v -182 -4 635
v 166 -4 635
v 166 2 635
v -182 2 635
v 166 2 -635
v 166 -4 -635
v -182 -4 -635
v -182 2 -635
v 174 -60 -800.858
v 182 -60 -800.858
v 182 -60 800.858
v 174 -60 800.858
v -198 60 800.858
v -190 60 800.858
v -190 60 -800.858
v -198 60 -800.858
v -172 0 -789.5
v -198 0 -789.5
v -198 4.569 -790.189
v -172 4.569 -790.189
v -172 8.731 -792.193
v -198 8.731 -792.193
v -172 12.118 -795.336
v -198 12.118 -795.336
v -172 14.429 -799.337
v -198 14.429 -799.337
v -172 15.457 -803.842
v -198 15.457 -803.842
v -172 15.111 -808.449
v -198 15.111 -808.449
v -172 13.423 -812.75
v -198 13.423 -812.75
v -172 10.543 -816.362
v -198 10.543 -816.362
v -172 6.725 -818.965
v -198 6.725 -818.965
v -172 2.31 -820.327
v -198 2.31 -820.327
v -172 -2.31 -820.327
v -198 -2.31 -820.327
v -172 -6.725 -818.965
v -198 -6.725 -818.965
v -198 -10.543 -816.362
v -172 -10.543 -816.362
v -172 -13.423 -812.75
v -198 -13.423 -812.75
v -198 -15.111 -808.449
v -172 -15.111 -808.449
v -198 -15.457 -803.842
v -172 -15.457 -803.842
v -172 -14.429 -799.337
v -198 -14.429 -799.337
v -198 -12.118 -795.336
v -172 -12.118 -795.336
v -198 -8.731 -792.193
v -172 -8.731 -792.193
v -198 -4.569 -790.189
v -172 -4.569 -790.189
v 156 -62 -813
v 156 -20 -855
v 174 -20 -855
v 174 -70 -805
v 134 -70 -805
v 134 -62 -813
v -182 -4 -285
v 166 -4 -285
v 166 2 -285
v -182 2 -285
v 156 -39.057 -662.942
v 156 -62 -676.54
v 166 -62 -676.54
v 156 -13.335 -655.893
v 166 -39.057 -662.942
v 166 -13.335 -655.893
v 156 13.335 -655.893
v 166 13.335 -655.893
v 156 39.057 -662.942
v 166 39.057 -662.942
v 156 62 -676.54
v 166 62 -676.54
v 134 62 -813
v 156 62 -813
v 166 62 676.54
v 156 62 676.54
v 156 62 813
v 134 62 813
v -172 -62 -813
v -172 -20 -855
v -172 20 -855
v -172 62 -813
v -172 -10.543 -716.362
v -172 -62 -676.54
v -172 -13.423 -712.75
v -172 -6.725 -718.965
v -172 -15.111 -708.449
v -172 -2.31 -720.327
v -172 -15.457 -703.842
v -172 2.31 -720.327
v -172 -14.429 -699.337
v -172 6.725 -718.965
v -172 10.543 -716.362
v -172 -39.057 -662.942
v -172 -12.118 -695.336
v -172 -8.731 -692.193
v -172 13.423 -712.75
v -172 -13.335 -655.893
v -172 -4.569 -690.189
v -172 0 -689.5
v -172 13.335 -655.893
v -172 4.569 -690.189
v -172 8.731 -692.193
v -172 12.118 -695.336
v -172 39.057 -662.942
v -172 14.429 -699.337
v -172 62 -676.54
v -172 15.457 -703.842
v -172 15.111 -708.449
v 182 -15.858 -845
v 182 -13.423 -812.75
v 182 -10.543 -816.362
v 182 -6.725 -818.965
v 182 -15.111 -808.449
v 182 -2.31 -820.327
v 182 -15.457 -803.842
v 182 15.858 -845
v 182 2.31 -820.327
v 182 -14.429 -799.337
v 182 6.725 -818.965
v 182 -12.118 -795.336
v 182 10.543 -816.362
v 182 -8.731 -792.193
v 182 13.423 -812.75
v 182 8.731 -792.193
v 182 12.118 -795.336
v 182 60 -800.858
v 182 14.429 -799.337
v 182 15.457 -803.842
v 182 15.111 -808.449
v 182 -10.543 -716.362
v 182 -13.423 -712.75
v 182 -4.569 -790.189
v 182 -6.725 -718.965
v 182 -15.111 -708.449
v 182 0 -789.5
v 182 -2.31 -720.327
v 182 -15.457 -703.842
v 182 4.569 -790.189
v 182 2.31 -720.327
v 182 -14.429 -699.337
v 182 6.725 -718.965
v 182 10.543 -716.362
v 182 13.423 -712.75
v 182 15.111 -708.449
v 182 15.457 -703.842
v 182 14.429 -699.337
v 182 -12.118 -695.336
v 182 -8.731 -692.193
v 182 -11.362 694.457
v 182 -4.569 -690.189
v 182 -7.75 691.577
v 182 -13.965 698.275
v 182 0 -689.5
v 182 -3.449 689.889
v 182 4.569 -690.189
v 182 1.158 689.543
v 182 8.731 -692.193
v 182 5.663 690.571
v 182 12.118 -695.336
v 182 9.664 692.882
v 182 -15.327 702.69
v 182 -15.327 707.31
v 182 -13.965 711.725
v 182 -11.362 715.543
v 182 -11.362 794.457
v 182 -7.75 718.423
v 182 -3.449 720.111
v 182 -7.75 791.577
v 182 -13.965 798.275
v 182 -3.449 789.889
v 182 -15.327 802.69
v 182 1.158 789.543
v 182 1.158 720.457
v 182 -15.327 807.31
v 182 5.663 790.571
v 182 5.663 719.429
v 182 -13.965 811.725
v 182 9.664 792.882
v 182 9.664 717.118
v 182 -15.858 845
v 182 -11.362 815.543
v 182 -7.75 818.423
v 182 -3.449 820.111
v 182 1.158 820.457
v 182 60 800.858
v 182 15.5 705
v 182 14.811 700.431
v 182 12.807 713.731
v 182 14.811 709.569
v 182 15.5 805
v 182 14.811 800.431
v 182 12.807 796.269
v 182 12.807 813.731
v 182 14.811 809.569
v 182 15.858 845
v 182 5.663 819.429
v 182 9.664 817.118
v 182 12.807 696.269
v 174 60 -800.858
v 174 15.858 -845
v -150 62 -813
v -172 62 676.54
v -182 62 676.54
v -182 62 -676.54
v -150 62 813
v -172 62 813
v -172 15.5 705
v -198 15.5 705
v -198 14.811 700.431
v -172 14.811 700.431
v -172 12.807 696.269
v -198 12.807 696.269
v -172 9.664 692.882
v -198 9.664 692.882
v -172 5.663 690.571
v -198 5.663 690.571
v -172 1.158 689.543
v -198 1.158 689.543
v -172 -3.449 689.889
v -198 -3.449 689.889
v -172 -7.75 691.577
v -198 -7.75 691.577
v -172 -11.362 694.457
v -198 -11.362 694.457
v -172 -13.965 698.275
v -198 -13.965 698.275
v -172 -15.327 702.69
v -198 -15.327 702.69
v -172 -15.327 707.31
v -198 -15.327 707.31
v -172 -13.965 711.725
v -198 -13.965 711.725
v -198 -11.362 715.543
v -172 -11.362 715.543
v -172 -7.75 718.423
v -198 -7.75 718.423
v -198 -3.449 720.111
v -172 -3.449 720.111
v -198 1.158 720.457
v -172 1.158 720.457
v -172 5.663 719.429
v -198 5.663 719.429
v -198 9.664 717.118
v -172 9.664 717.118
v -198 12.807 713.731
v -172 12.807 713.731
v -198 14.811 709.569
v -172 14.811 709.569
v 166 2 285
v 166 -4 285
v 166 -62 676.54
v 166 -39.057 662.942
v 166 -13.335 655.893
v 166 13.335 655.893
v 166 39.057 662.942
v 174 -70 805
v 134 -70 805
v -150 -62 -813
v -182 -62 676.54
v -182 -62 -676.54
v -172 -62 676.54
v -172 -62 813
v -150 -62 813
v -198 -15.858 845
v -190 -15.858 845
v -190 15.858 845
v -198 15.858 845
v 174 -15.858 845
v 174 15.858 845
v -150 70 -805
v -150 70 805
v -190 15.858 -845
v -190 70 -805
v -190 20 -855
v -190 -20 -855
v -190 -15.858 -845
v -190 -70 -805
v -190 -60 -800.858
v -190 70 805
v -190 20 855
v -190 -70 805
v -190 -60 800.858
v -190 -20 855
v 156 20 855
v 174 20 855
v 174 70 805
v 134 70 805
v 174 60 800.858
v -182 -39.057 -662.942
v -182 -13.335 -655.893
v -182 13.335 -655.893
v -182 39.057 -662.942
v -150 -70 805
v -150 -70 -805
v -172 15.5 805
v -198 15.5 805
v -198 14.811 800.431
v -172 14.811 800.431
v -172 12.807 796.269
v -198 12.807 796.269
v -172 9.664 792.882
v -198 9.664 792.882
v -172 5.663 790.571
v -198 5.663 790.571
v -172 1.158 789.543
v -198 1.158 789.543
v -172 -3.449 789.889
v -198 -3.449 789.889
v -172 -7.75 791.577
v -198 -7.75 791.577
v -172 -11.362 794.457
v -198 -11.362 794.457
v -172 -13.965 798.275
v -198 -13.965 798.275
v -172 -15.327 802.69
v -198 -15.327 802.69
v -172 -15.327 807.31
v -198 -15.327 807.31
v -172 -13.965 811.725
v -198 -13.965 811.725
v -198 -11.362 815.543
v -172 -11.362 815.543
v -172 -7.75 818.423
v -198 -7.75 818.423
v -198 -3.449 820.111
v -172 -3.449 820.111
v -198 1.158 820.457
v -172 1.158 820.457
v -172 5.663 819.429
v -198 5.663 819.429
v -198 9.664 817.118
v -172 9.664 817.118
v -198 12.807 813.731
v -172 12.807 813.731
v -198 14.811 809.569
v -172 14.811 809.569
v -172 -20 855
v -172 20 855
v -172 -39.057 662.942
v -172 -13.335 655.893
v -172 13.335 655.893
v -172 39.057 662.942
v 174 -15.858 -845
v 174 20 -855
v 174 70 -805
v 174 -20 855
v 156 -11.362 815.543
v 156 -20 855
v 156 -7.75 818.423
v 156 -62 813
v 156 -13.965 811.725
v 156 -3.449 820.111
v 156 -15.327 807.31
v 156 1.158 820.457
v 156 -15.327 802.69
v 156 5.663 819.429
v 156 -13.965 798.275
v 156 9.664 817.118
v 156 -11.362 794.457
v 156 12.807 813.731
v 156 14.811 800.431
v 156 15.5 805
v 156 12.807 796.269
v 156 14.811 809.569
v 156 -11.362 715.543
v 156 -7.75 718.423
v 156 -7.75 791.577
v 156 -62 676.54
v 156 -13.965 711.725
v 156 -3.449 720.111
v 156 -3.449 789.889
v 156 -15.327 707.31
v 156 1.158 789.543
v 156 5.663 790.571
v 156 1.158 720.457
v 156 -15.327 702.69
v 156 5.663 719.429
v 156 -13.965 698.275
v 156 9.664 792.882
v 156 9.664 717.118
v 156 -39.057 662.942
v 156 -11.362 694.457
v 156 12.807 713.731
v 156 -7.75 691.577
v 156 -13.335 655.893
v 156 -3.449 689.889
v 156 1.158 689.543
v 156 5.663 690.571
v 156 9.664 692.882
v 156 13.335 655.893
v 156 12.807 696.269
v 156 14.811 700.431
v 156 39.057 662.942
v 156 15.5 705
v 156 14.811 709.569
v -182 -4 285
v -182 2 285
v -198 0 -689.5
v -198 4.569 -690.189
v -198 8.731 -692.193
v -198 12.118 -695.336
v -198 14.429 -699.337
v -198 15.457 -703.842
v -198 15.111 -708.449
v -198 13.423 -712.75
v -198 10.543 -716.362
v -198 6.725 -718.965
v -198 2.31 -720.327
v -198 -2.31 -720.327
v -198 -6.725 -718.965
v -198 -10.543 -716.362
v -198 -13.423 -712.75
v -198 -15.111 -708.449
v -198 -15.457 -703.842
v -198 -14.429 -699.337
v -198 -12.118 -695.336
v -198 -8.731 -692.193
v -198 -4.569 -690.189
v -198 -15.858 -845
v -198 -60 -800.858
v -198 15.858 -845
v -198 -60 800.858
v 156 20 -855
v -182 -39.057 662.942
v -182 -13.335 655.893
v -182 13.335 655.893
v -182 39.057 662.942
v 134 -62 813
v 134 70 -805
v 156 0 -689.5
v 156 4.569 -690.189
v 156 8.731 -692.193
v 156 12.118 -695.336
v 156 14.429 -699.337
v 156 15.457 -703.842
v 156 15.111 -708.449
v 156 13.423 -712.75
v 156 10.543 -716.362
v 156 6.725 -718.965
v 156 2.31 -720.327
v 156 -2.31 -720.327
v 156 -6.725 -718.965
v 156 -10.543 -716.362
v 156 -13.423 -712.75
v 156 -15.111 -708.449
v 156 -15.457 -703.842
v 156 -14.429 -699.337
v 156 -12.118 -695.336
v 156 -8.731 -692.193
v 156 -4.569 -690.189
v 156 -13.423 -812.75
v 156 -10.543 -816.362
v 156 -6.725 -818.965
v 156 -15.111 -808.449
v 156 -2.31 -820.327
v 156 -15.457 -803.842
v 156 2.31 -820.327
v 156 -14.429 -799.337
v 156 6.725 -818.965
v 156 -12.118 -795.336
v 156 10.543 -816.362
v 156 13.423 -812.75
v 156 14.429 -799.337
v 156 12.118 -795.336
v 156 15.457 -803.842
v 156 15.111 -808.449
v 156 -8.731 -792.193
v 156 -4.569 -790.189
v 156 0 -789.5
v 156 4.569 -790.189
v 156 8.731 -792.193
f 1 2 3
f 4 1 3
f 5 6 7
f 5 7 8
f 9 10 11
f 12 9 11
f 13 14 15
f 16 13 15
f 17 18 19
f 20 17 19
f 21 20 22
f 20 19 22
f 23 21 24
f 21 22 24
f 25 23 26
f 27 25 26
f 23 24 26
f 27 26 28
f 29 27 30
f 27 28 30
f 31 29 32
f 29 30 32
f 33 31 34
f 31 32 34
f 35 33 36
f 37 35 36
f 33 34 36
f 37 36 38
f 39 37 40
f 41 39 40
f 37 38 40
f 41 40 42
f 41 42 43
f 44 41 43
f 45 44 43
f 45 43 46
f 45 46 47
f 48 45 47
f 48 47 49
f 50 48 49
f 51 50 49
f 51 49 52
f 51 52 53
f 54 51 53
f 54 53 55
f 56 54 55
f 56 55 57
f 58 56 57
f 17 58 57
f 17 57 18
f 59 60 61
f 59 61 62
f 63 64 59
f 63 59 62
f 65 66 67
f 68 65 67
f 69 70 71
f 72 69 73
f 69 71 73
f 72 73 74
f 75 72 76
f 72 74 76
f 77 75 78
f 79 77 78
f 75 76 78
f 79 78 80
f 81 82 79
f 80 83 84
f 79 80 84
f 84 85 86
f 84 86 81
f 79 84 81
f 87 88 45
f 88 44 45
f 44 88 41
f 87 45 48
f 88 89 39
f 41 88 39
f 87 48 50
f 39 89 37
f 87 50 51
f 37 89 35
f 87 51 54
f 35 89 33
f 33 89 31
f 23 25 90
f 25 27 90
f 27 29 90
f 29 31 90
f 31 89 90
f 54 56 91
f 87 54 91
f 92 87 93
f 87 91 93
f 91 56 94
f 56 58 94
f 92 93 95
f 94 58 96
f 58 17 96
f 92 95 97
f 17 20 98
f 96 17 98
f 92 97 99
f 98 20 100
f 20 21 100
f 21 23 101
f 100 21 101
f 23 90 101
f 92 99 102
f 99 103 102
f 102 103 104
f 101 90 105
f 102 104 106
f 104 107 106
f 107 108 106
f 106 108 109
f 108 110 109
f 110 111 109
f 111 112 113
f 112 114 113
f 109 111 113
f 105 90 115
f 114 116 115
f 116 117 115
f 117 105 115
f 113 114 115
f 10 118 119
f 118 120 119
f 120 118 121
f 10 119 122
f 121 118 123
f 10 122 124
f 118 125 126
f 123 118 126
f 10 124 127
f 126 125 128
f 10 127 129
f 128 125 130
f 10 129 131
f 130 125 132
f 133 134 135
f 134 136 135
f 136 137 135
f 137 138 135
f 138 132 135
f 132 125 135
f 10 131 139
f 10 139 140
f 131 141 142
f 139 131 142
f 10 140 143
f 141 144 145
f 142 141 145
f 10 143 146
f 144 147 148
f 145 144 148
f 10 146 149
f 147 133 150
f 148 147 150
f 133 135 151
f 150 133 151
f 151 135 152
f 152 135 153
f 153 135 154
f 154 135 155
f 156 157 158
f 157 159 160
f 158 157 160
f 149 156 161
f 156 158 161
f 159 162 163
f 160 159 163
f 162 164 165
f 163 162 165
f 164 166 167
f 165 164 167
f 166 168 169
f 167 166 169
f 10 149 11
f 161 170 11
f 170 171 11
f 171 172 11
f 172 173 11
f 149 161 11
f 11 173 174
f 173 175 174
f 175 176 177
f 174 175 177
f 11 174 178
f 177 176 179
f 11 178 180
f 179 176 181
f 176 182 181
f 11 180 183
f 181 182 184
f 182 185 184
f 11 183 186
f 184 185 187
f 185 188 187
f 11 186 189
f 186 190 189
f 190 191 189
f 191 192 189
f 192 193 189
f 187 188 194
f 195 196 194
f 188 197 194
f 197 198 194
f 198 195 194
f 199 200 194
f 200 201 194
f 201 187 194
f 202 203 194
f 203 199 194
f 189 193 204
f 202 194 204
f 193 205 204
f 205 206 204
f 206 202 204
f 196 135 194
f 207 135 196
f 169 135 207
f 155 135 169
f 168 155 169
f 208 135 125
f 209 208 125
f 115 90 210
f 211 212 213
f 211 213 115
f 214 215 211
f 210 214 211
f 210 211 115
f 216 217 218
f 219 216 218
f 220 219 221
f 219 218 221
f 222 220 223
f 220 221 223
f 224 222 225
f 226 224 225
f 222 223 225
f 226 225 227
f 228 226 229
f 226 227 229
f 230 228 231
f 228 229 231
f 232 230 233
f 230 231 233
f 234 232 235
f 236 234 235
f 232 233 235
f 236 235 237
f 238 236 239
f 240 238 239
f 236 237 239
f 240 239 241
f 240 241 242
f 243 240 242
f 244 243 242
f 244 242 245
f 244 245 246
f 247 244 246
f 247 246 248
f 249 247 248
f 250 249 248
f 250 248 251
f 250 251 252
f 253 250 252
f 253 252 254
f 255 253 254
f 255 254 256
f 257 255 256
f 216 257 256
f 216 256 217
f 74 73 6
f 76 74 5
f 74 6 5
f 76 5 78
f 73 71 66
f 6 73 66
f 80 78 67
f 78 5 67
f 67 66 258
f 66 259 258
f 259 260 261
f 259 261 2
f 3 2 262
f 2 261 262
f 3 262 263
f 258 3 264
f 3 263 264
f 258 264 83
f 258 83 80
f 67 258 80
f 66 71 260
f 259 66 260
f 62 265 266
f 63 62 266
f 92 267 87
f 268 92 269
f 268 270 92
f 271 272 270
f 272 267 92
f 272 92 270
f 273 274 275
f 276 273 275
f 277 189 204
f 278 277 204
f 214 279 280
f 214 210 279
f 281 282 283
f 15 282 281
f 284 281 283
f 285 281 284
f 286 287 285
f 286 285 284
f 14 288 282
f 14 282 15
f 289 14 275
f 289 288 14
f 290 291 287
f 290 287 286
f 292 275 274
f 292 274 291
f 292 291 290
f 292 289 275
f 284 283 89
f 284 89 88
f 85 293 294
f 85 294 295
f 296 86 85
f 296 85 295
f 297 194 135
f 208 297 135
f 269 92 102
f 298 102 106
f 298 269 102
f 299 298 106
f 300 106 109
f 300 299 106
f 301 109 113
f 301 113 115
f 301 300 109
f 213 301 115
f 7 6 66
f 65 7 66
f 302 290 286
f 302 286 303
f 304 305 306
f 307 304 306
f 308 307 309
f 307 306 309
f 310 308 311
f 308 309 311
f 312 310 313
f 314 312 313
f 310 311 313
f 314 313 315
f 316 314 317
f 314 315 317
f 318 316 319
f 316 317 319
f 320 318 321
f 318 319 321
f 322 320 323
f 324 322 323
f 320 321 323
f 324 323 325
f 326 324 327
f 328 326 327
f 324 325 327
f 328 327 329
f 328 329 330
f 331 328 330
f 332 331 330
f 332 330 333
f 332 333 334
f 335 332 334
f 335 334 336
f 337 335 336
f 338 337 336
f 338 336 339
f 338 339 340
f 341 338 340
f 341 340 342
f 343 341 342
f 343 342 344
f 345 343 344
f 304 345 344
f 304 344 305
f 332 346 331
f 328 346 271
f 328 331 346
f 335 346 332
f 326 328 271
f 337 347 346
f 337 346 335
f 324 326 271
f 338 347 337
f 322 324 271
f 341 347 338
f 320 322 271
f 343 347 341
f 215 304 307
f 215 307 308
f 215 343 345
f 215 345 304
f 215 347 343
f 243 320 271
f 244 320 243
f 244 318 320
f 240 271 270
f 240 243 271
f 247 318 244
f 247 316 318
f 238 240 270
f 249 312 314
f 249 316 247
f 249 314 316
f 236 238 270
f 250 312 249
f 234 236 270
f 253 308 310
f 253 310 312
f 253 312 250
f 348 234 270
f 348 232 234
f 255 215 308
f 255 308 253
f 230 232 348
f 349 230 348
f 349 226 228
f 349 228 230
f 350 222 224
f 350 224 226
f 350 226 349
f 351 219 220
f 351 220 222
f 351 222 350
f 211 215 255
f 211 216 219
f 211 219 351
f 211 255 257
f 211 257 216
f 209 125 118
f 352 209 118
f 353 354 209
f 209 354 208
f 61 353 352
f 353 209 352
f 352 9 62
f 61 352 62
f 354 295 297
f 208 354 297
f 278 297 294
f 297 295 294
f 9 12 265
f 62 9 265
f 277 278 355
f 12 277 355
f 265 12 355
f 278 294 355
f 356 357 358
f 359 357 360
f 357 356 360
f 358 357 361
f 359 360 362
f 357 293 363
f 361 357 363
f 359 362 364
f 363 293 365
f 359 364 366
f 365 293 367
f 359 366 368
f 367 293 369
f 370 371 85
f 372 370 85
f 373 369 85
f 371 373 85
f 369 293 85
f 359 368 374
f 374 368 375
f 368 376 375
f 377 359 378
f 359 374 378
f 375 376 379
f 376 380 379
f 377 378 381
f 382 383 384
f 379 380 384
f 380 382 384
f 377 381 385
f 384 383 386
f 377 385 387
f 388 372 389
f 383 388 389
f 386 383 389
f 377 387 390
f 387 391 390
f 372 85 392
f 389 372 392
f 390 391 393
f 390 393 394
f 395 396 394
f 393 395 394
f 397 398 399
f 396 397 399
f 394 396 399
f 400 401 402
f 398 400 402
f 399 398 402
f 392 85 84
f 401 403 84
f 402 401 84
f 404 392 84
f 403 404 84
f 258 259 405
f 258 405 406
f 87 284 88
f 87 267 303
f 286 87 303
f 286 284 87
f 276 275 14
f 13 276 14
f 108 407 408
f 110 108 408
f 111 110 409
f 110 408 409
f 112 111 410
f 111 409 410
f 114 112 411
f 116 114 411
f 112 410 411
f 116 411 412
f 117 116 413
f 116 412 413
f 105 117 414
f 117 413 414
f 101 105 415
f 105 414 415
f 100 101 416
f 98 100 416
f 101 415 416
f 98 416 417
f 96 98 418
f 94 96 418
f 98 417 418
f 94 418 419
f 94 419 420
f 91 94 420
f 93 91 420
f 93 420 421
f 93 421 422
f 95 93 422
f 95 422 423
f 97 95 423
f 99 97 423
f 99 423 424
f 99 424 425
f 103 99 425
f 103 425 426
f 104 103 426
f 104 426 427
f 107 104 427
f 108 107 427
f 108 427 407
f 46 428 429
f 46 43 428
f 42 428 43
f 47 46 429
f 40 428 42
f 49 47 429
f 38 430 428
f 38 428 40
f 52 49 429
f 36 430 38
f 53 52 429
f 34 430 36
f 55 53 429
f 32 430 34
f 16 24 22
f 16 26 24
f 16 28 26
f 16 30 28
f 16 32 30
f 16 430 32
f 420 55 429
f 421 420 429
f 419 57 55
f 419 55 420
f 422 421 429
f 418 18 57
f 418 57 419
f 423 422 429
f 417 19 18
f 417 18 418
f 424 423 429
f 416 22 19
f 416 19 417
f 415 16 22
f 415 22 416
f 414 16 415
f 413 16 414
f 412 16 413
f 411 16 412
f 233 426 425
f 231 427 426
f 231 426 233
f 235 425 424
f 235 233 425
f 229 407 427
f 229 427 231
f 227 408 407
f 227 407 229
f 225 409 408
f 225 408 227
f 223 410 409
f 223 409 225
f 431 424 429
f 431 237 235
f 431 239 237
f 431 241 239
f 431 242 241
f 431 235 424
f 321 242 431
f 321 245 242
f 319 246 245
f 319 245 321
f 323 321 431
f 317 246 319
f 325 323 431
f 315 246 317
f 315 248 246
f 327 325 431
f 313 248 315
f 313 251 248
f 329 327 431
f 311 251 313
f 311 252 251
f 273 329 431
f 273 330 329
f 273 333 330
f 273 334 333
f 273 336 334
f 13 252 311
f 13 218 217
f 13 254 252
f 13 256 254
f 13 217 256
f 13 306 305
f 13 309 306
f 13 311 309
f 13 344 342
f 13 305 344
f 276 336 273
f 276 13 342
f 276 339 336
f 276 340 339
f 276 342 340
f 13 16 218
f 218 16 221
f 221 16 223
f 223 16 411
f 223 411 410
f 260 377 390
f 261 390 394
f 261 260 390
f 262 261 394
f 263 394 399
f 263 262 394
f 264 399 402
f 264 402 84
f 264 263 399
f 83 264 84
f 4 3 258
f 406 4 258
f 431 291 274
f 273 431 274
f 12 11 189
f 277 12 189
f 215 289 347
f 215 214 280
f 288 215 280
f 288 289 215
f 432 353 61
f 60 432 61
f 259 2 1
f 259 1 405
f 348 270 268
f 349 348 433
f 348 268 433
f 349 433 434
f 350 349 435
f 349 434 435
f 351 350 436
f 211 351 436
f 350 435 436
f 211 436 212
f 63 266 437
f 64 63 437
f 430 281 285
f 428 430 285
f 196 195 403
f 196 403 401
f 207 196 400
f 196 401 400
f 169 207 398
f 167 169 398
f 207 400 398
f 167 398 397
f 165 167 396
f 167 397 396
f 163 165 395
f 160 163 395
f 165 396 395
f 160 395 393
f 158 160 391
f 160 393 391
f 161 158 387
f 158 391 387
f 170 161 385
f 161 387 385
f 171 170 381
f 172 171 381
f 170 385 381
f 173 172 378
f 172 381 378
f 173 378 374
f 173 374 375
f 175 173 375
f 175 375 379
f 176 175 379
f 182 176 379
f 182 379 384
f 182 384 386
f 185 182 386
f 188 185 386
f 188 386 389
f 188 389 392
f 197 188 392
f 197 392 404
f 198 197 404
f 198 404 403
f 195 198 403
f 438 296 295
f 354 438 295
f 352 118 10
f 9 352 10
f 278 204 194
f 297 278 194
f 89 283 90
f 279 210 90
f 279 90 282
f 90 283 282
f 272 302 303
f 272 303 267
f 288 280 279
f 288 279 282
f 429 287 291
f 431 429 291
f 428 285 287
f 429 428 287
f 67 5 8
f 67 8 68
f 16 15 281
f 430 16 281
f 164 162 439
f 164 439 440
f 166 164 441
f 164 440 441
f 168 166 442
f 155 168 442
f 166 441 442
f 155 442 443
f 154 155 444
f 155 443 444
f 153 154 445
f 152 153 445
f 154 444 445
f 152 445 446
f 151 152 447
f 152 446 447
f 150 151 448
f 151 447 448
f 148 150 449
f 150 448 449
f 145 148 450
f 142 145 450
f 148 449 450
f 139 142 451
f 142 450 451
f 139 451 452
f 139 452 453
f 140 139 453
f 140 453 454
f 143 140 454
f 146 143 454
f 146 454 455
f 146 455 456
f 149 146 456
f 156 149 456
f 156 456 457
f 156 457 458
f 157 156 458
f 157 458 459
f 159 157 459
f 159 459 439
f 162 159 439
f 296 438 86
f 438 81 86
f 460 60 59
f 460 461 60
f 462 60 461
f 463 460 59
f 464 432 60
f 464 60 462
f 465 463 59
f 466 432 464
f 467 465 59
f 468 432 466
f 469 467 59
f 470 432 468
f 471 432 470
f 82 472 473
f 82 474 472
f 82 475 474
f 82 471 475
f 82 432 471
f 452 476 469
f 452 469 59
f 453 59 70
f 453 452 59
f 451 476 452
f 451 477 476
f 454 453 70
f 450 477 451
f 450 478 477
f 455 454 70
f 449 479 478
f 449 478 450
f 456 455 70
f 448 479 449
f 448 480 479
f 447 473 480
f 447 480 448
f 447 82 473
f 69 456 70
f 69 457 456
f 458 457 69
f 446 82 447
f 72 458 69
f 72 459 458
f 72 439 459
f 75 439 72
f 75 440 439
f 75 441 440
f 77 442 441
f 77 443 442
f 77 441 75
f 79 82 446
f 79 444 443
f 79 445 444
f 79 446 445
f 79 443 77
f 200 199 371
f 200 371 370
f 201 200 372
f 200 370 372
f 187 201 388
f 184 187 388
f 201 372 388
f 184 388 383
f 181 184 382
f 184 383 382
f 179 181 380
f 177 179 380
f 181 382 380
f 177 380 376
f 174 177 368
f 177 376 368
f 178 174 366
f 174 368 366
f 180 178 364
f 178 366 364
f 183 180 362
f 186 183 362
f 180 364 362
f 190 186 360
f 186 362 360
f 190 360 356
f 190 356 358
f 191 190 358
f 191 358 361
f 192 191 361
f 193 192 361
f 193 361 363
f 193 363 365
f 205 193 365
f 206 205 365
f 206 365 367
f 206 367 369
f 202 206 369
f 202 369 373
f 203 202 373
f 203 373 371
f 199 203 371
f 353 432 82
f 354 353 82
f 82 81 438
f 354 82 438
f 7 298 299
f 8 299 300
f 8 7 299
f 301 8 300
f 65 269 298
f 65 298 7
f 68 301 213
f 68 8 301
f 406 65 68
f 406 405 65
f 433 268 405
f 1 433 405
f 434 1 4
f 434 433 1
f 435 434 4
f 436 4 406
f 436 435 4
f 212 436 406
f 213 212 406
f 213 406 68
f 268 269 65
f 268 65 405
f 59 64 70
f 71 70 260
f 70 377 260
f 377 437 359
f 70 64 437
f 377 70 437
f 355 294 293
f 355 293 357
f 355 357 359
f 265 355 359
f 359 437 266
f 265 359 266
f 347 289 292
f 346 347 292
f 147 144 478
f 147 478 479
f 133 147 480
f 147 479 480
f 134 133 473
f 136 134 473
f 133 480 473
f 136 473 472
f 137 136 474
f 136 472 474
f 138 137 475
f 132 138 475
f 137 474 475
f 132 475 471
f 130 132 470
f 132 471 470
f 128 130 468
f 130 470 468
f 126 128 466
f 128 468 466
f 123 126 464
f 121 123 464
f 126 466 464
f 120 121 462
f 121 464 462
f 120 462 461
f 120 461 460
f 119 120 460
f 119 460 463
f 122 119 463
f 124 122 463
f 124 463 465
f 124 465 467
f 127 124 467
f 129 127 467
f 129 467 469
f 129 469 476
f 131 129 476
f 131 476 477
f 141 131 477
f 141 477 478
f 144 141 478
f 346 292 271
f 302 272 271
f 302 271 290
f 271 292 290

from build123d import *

# Parameters (mm, degrees)
EXTRUDE_1_DEPTH        = 855
EXTRUDE_2_DEPTH        = 10
SKETCH_3_W             = 350
SKETCH_3_H             = 6
EXTRUDE_3_DEPTH        = 174
CUT_EXTRUDE_9_DEPTH    = 932.891088057
EXTRUDE_7_DEPTH        = 8
PATTERN_LINEAR_1_COUNT = 2
PATTERN_LINEAR_1_PITCH = 372
SKETCH_9_R             = 15.5
CUT_EXTRUDE_10_DEPTH   = 939.256361556


with BuildPart() as part:
    # 草图1 → 拉伸1 (new body)
    with BuildSketch(Plane.XY):
        Polygon((-150, 70), (-190, 70), (-190, -70), (-150, -70), (-150, -62), (-182, -62), (-182, 62), (-150, 62), align=None)
    extrude(amount=EXTRUDE_1_DEPTH)

    # 草图2 → 拉伸2 (add)
    with BuildSketch(Plane(origin=(-182, 0, 0), x_dir=(0, 0, -1), z_dir=(1, 0, 0))):
        with BuildLine():
            Line((-676.539819016, 62), (-855, 62))
            Line((-855, 62), (-855, -62))
            Line((-855, -62), (-676.539819016, -62))
            ThreePointArc((-676.539819016, -62), (-655, 0), (-676.539819016, 62))
        make_face()
    extrude(amount=EXTRUDE_2_DEPTH)

    # 草图3 → 拉伸3 (add)
    with BuildSketch(Plane(origin=(-182, 0, 0), x_dir=(0, 0, -1), z_dir=(1, 0, 0))):
        with Locations((-460, -1)):
            Rectangle(SKETCH_3_W, SKETCH_3_H)
    extrude(amount=EXTRUDE_3_DEPTH)

    # 镜向1: part across plane


with BuildPart() as part_1:
    add(part.part)
    add(part.part.mirror(Plane(origin=(-8, -4, 635), x_dir=(0, 0, 1), z_dir=(1, 0, 0))))

    # 草图8 → 拉伸9 (cut, through all)
    with BuildSketch(Plane.ZY.offset(190)):
        Polygon((805, 70), (855, 70), (855, 20), align=None)
        Polygon((855, -70), (855, -20), (805, -70), align=None)
    extrude(amount=-CUT_EXTRUDE_9_DEPTH, mode=Mode.SUBTRACT)

    # 镜向2: part across plane


with BuildPart() as part_2:
    add(part_1.part)
    add(part_1.part.mirror(Plane.XY))

    # 草图6 → 拉伸7 (add)
    with BuildSketch(Plane.ZY.offset(190)):
        Polygon((-800.857864376, 60), (-845, 15.857864376), (-845, -15.857864376), (-800.857864376, -60), (800.857864376, -60), (845, -15.857864376), (845, 15.857864376), (800.857864376, 60), align=None)
    extrude_7 = extrude(amount=EXTRUDE_7_DEPTH)

    # 阵列(线性)1: 拉伸7 ×2
    with Locations(*[(i * PATTERN_LINEAR_1_PITCH, 0, 0) for i in range(1, PATTERN_LINEAR_1_COUNT)]):
        add(extrude_7)

    # 草图9 → 拉伸10 (cut, through all)
    with BuildSketch(Plane.ZY.offset(198)):
        with Locations((-805, 0)):
            Circle(SKETCH_9_R)
        with Locations((-705, 0)):
            Circle(SKETCH_9_R)
        with Locations(Location((705, 0, 0), (0, 0, 90))):
            Circle(SKETCH_9_R)
        with Locations(Location((805, 0, 0), (0, 0, 90))):
            Circle(SKETCH_9_R)
    extrude(amount=-CUT_EXTRUDE_10_DEPTH, mode=Mode.SUBTRACT)


solid = part_2.part
